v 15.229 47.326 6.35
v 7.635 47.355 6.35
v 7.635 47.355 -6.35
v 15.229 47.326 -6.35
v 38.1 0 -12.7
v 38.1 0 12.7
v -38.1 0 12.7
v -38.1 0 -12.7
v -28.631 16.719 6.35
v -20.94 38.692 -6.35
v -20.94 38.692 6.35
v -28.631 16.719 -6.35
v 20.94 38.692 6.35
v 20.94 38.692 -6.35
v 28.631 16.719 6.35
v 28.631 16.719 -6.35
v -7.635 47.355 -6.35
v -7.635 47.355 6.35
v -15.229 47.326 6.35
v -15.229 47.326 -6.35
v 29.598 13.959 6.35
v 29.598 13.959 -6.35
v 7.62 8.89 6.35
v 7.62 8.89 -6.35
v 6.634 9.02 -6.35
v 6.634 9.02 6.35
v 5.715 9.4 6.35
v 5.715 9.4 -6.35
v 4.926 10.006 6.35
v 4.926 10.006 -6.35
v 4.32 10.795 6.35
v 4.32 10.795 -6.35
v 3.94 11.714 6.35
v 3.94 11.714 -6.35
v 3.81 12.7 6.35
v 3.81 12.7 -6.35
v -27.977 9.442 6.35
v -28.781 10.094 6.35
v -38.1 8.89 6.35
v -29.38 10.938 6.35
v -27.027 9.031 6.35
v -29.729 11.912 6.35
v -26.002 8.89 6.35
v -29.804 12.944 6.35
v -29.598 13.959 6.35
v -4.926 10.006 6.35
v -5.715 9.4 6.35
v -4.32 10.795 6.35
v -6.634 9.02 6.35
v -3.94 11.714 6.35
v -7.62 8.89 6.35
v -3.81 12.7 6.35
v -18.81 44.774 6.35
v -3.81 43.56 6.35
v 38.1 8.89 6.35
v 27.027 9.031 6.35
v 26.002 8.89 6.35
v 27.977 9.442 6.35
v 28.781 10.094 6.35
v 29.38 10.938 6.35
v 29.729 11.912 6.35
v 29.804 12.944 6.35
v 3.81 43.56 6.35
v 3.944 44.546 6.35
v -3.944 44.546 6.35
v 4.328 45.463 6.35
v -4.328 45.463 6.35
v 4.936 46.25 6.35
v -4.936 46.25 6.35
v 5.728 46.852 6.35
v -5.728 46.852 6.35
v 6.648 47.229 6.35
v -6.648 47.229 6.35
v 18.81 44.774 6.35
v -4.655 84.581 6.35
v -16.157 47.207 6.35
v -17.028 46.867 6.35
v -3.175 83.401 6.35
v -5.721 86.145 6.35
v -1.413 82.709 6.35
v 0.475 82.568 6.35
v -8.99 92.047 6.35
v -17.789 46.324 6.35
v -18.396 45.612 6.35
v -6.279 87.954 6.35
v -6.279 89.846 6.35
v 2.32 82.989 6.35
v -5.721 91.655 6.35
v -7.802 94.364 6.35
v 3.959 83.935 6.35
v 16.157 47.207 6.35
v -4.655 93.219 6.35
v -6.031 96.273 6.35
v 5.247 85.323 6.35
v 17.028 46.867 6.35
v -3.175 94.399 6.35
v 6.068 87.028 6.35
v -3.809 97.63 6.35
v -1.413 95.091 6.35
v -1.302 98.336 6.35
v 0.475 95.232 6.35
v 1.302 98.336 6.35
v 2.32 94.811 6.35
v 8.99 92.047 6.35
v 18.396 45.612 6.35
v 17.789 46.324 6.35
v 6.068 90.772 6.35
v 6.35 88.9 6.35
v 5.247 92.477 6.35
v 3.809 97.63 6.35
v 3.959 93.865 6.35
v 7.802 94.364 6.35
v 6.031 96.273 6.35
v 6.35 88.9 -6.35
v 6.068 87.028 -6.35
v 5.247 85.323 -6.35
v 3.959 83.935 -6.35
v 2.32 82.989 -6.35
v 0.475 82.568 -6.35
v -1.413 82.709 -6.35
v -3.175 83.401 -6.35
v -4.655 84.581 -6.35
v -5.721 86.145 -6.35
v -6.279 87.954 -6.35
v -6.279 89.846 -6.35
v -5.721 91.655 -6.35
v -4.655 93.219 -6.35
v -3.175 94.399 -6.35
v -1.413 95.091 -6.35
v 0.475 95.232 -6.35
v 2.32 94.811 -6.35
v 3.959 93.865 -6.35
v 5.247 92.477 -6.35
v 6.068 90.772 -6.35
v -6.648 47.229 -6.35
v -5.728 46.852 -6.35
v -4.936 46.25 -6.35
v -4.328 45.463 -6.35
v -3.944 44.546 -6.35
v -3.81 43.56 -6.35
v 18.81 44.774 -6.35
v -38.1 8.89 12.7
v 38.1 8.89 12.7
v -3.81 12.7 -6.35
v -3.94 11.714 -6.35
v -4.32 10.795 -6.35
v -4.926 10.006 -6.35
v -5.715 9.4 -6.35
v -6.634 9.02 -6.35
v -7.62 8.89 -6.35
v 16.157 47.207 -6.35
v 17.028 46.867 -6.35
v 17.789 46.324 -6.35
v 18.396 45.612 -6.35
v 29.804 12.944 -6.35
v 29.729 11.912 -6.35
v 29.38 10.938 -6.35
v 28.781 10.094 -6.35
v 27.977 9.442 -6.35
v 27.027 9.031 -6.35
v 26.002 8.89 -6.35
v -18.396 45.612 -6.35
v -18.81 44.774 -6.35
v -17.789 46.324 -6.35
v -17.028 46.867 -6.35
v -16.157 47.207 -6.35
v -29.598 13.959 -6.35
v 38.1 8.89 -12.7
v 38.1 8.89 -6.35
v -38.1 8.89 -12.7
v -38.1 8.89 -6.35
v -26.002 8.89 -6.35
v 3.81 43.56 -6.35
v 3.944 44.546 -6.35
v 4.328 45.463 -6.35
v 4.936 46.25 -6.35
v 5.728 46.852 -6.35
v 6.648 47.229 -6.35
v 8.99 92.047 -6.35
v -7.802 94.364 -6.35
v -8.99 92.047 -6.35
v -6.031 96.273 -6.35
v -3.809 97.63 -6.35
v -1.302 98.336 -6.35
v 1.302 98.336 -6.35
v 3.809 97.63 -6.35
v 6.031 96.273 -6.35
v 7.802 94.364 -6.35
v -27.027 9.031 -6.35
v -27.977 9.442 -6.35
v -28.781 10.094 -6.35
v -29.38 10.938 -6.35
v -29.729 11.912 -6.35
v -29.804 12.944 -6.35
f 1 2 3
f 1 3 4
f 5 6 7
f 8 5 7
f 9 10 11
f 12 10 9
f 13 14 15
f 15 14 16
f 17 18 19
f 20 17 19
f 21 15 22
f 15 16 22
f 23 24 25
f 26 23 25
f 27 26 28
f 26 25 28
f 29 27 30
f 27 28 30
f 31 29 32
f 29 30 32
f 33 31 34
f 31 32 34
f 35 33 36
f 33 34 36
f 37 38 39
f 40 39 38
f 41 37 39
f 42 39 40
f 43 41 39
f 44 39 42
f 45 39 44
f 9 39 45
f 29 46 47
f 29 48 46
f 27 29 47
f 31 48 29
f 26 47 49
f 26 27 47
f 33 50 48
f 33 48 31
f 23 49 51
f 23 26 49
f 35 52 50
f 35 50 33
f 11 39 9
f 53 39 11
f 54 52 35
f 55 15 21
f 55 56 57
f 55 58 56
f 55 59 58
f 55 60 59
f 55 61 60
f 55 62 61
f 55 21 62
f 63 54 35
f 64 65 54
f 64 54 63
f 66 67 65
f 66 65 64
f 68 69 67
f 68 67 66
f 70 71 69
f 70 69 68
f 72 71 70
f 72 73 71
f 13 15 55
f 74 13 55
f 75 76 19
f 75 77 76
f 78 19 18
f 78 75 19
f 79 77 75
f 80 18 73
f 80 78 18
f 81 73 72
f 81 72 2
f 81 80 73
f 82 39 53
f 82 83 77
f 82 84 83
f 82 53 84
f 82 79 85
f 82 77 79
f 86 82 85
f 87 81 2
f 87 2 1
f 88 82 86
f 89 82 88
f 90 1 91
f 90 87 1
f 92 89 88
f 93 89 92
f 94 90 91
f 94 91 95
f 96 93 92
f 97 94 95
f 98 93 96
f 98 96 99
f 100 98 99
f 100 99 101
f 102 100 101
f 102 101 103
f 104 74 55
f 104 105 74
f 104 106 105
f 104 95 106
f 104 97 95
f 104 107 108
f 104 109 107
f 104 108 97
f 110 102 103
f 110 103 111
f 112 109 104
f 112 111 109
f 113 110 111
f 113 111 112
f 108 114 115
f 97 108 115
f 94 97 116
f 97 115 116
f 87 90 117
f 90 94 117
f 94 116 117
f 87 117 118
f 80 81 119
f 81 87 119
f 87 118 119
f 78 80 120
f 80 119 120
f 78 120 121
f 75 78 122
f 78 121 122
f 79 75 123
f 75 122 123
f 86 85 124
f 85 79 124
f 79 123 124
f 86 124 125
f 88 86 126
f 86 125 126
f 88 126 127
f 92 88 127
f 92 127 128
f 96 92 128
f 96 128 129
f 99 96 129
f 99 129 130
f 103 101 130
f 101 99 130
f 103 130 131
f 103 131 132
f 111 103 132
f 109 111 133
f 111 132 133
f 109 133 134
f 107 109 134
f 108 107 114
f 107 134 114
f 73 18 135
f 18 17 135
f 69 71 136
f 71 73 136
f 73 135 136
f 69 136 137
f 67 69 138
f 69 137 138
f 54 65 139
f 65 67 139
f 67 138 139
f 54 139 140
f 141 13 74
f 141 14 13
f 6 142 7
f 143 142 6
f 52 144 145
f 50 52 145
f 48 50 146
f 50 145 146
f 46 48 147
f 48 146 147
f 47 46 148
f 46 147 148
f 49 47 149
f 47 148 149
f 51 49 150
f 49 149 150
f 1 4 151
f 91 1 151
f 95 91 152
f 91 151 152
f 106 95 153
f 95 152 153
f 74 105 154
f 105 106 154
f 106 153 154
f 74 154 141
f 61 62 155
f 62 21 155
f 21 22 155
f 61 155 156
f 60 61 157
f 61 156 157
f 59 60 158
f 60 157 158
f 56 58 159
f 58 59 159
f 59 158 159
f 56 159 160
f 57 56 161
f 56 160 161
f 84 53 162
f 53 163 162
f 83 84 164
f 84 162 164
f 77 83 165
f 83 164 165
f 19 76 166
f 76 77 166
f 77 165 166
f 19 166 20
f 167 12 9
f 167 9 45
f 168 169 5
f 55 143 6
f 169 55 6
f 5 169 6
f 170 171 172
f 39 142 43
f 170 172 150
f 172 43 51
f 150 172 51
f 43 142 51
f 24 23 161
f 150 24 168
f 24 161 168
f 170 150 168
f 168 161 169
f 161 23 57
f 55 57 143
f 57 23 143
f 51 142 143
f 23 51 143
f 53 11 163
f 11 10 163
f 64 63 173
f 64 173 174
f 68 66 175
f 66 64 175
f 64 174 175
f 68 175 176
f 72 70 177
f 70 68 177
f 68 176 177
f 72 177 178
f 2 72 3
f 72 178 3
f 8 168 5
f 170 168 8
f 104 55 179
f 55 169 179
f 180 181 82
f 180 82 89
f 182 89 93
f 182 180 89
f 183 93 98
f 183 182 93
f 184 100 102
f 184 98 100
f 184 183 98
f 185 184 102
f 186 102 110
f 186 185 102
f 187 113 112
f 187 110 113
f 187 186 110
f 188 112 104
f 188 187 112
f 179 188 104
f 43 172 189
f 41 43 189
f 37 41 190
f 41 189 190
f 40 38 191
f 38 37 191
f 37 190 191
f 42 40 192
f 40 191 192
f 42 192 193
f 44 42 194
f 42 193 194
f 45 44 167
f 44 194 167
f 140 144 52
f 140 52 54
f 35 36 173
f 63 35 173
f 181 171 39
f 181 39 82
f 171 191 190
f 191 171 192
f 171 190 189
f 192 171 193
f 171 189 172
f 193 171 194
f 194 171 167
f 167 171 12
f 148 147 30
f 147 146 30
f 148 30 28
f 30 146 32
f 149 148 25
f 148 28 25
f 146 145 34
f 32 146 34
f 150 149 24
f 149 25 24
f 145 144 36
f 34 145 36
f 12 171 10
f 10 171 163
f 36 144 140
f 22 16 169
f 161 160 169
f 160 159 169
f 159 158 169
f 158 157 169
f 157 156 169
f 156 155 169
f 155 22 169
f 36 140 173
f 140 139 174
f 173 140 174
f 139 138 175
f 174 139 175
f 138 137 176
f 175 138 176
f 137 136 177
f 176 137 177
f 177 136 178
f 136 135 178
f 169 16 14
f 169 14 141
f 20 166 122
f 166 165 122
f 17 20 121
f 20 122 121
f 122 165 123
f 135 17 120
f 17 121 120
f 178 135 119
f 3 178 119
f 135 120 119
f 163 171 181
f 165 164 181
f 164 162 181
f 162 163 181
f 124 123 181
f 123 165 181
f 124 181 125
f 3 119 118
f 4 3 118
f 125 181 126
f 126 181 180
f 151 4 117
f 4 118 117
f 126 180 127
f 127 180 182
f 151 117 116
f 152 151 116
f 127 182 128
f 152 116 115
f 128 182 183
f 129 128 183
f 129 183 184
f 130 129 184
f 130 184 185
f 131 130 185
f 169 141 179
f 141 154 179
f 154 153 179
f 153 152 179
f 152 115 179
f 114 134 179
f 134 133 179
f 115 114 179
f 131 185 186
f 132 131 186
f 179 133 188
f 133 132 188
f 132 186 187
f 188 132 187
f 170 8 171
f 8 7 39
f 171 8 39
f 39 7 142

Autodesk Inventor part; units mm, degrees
ref_plane "YZ Plane" through (0, 0, 0) normal (1, 0, 0) x (0, 1, 0)
ref_plane "XZ Plane" through (0, 0, 0) normal (0, 1, 0) x (-1, 0, 0)
ref_plane "XY Plane" through (0, 0, 0) normal (0, 0, 1) x (1, 0, 0)
sketch "Sketch1" plane through (0, 0, 0) normal (0, 0, 1) x (1, 0, 0)
  line L0 (0, 0) -> (0, 88.9) construction
  circle A0 centre (0, 88.9) radius 6.35
  arc A1 (8.9901, 92.0471) -> (-8.9901, 92.0471) centre (0, 88.9) ccw
  line L1 (0, 0) -> (-38.1, 0)
  line L2 (-38.1, 0) -> (-38.1, 8.89)
  line L3 (-38.1, 8.89) -> (-8.9901, 92.0471)
  line L4 (0, 0) -> (38.1, 0)
  line L5 (38.1, 0) -> (38.1, 8.89)
  line L6 (38.1, 8.89) -> (8.9901, 92.0471)
  line L7 (-20.9396, 38.6924) -> (-28.6314, 16.7194)
  line L8 (-20.9396, 12.7) -> (0, 12.7) construction
  arc A2 (-29.5978, 13.9588) -> (-26.0017, 8.89) centre (-26.0017, 12.7) ccw
  line L9 (-28.6314, 16.7194) -> (-29.5978, 13.9588)
  line L10 (-20.9396, 8.89) -> (-26.0017, 8.89)
  line L11 (-20.9396, 12.7) -> (-26.0017, 12.7) construction
  circle A3 centre (0, 12.7) radius 3.81 construction
  arc A4 (-7.62, 8.89) -> (-3.81, 12.7) centre (-7.62, 12.7) ccw
  line L12 (-3.81, 12.7) -> (-3.81, 43.5601)
  line L13 (-26.0017, 12.7) -> (-13.8789, 47.3309) construction
  line L14 (-23.545, 50.4685) -> (0, 42.2264) construction
  line L15 (-24.8039, 46.8725) -> (0, 38.1897) construction
  line L16 (-20.9396, 38.6924) -> (-18.8105, 44.7745)
  line L17 (-15.2144, 43.5156) -> (-3.81, 43.5601) construction
  circle A5 centre (-3.81, 43.5601) radius 3.81 construction
  line L18 (-7.6348, 47.3552) -> (-15.2293, 47.3256)
  arc A6 (-15.2293, 47.3256) -> (-18.8105, 44.7745) centre (-15.2144, 43.5156) ccw
  arc A7 (-3.81, 43.5304) -> (-7.6348, 47.3552) centre (-7.62, 43.5452) ccw
  line L19 (-20.9396, 8.89) -> (-7.62, 8.89)
  line L20 (20.9396, 38.6924) -> (28.6314, 16.7194)
  arc A8 (26.0017, 8.89) -> (29.5978, 13.9588) centre (26.0017, 12.7) ccw
  line L21 (20.9396, 8.89) -> (26.0017, 8.89)
  arc A9 (3.81, 12.7) -> (7.62, 8.89) centre (7.62, 12.7) ccw
  line L22 (3.81, 12.7) -> (3.81, 43.5601)
  line L23 (20.9396, 38.6924) -> (18.8105, 44.7745)
  line L24 (7.6348, 47.3552) -> (15.2293, 47.3256)
  arc A10 (18.8105, 44.7745) -> (15.2293, 47.3256) centre (15.2144, 43.5156) ccw
  arc A11 (7.6348, 47.3552) -> (3.81, 43.5304) centre (7.62, 43.5452) ccw
  line L25 (20.9396, 8.89) -> (7.62, 8.89)
  line L26 (28.6314, 16.7194) -> (29.5978, 13.9588)
  point P0 (-3.81, 64.5628)
  dimension "d20" = 7.62
  dimension "d0" = 88.9
  dimension "d2" = 12.7
  dimension "d3" = 19.05
  dimension "d5" = 38.1
  dimension "d6" = 90
  dimension "d7" = 8.89
  dimension "d14" = 6.35
  dimension "d16" = 7.62
  dimension "d17" = 70.707
  dimension "d18" = 3.81
  dimension "d22" = 3.81
  dimension "d23" = 3.81
  dimension "d24" = 12.7
  dimension "d25" = 3.81
extrude "Extrusion1" add sketch "Sketch1" along normal mid plane 12.7
sketch "Sketch2" plane through (0, 0, 6.35) normal (0, 0, 1) x (1, 0, 0)
  arc A0 (26.0017, 8.89) -> (29.5978, 13.9588) centre (26.0017, 12.7) ccw projected
  line L0 (26.0017, 8.89) -> (7.62, 8.89) projected
  arc A1 (3.81, 12.7) -> (7.62, 8.89) centre (7.62, 12.7) ccw projected
  line L1 (3.81, 12.7) -> (3.81, 43.5304) projected
  arc A2 (7.6348, 47.3552) -> (3.81, 43.5304) centre (7.62, 43.5452) ccw projected
  line L2 (7.6348, 47.3552) -> (15.2293, 47.3256) projected
  arc A3 (18.8105, 44.7745) -> (15.2293, 47.3256) centre (15.2144, 43.5156) ccw projected
  line L3 (18.8105, 44.7745) -> (29.5978, 13.9588) projected
  arc A4 (-15.2293, 47.3256) -> (-18.8105, 44.7745) centre (-15.2144, 43.5156) ccw projected
  line L4 (-15.2293, 47.3256) -> (-7.6348, 47.3552) projected
  arc A5 (-3.81, 43.5304) -> (-7.6348, 47.3552) centre (-7.62, 43.5452) ccw projected
  line L5 (-3.81, 43.5304) -> (-3.81, 12.7) projected
  arc A6 (-7.62, 8.89) -> (-3.81, 12.7) centre (-7.62, 12.7) ccw projected
  line L6 (-7.62, 8.89) -> (-26.0017, 8.89) projected
  arc A7 (-29.5978, 13.9588) -> (-26.0017, 8.89) centre (-26.0017, 12.7) ccw projected
  line L7 (-29.5978, 13.9588) -> (-18.8105, 44.7745) projected
  circle A8 centre (0, 88.9) radius 6.35 projected
  line L8 (-38.1, 0) -> (38.1, 0) projected
  line L9 (38.1, 0) -> (38.1, 8.89) projected
  line L10 (38.1, 8.89) -> (8.9901, 92.0471) projected
  arc A9 (8.9901, 92.0471) -> (-8.9901, 92.0471) centre (0, 88.9) ccw projected
  line L11 (-8.9901, 92.0471) -> (-38.1, 8.89) projected
  line L12 (-38.1, 8.89) -> (-38.1, 0) projected
  point P0 (0, 0)
sketch "Sketch3" plane through (0, 0, 6.35) normal (0, 0, 1) x (1, 0, 0)
  line L0 (-38.1, 0) -> (38.1, 0) projected
  line L1 (38.1, 0) -> (38.1, 8.89) projected
  line L2 (-38.1, 0) -> (38.1, 0)
  line L3 (38.1, 0) -> (38.1, 8.89)
  line L4 (38.1, 8.89) -> (-38.1, 8.89)
  line L5 (-38.1, 8.89) -> (-38.1, 0)
  point P0 (0, 0)
extrude "Extrusion2" add sketch "Sketch3" along normal blind 6.35
mirror "Mirror1" about plane through (0, 0, 0) normal (0, 0, 1) of "Extrusion2"
properties part number "Y_axis_shaft_end_support" material "Aluminum 6061"
